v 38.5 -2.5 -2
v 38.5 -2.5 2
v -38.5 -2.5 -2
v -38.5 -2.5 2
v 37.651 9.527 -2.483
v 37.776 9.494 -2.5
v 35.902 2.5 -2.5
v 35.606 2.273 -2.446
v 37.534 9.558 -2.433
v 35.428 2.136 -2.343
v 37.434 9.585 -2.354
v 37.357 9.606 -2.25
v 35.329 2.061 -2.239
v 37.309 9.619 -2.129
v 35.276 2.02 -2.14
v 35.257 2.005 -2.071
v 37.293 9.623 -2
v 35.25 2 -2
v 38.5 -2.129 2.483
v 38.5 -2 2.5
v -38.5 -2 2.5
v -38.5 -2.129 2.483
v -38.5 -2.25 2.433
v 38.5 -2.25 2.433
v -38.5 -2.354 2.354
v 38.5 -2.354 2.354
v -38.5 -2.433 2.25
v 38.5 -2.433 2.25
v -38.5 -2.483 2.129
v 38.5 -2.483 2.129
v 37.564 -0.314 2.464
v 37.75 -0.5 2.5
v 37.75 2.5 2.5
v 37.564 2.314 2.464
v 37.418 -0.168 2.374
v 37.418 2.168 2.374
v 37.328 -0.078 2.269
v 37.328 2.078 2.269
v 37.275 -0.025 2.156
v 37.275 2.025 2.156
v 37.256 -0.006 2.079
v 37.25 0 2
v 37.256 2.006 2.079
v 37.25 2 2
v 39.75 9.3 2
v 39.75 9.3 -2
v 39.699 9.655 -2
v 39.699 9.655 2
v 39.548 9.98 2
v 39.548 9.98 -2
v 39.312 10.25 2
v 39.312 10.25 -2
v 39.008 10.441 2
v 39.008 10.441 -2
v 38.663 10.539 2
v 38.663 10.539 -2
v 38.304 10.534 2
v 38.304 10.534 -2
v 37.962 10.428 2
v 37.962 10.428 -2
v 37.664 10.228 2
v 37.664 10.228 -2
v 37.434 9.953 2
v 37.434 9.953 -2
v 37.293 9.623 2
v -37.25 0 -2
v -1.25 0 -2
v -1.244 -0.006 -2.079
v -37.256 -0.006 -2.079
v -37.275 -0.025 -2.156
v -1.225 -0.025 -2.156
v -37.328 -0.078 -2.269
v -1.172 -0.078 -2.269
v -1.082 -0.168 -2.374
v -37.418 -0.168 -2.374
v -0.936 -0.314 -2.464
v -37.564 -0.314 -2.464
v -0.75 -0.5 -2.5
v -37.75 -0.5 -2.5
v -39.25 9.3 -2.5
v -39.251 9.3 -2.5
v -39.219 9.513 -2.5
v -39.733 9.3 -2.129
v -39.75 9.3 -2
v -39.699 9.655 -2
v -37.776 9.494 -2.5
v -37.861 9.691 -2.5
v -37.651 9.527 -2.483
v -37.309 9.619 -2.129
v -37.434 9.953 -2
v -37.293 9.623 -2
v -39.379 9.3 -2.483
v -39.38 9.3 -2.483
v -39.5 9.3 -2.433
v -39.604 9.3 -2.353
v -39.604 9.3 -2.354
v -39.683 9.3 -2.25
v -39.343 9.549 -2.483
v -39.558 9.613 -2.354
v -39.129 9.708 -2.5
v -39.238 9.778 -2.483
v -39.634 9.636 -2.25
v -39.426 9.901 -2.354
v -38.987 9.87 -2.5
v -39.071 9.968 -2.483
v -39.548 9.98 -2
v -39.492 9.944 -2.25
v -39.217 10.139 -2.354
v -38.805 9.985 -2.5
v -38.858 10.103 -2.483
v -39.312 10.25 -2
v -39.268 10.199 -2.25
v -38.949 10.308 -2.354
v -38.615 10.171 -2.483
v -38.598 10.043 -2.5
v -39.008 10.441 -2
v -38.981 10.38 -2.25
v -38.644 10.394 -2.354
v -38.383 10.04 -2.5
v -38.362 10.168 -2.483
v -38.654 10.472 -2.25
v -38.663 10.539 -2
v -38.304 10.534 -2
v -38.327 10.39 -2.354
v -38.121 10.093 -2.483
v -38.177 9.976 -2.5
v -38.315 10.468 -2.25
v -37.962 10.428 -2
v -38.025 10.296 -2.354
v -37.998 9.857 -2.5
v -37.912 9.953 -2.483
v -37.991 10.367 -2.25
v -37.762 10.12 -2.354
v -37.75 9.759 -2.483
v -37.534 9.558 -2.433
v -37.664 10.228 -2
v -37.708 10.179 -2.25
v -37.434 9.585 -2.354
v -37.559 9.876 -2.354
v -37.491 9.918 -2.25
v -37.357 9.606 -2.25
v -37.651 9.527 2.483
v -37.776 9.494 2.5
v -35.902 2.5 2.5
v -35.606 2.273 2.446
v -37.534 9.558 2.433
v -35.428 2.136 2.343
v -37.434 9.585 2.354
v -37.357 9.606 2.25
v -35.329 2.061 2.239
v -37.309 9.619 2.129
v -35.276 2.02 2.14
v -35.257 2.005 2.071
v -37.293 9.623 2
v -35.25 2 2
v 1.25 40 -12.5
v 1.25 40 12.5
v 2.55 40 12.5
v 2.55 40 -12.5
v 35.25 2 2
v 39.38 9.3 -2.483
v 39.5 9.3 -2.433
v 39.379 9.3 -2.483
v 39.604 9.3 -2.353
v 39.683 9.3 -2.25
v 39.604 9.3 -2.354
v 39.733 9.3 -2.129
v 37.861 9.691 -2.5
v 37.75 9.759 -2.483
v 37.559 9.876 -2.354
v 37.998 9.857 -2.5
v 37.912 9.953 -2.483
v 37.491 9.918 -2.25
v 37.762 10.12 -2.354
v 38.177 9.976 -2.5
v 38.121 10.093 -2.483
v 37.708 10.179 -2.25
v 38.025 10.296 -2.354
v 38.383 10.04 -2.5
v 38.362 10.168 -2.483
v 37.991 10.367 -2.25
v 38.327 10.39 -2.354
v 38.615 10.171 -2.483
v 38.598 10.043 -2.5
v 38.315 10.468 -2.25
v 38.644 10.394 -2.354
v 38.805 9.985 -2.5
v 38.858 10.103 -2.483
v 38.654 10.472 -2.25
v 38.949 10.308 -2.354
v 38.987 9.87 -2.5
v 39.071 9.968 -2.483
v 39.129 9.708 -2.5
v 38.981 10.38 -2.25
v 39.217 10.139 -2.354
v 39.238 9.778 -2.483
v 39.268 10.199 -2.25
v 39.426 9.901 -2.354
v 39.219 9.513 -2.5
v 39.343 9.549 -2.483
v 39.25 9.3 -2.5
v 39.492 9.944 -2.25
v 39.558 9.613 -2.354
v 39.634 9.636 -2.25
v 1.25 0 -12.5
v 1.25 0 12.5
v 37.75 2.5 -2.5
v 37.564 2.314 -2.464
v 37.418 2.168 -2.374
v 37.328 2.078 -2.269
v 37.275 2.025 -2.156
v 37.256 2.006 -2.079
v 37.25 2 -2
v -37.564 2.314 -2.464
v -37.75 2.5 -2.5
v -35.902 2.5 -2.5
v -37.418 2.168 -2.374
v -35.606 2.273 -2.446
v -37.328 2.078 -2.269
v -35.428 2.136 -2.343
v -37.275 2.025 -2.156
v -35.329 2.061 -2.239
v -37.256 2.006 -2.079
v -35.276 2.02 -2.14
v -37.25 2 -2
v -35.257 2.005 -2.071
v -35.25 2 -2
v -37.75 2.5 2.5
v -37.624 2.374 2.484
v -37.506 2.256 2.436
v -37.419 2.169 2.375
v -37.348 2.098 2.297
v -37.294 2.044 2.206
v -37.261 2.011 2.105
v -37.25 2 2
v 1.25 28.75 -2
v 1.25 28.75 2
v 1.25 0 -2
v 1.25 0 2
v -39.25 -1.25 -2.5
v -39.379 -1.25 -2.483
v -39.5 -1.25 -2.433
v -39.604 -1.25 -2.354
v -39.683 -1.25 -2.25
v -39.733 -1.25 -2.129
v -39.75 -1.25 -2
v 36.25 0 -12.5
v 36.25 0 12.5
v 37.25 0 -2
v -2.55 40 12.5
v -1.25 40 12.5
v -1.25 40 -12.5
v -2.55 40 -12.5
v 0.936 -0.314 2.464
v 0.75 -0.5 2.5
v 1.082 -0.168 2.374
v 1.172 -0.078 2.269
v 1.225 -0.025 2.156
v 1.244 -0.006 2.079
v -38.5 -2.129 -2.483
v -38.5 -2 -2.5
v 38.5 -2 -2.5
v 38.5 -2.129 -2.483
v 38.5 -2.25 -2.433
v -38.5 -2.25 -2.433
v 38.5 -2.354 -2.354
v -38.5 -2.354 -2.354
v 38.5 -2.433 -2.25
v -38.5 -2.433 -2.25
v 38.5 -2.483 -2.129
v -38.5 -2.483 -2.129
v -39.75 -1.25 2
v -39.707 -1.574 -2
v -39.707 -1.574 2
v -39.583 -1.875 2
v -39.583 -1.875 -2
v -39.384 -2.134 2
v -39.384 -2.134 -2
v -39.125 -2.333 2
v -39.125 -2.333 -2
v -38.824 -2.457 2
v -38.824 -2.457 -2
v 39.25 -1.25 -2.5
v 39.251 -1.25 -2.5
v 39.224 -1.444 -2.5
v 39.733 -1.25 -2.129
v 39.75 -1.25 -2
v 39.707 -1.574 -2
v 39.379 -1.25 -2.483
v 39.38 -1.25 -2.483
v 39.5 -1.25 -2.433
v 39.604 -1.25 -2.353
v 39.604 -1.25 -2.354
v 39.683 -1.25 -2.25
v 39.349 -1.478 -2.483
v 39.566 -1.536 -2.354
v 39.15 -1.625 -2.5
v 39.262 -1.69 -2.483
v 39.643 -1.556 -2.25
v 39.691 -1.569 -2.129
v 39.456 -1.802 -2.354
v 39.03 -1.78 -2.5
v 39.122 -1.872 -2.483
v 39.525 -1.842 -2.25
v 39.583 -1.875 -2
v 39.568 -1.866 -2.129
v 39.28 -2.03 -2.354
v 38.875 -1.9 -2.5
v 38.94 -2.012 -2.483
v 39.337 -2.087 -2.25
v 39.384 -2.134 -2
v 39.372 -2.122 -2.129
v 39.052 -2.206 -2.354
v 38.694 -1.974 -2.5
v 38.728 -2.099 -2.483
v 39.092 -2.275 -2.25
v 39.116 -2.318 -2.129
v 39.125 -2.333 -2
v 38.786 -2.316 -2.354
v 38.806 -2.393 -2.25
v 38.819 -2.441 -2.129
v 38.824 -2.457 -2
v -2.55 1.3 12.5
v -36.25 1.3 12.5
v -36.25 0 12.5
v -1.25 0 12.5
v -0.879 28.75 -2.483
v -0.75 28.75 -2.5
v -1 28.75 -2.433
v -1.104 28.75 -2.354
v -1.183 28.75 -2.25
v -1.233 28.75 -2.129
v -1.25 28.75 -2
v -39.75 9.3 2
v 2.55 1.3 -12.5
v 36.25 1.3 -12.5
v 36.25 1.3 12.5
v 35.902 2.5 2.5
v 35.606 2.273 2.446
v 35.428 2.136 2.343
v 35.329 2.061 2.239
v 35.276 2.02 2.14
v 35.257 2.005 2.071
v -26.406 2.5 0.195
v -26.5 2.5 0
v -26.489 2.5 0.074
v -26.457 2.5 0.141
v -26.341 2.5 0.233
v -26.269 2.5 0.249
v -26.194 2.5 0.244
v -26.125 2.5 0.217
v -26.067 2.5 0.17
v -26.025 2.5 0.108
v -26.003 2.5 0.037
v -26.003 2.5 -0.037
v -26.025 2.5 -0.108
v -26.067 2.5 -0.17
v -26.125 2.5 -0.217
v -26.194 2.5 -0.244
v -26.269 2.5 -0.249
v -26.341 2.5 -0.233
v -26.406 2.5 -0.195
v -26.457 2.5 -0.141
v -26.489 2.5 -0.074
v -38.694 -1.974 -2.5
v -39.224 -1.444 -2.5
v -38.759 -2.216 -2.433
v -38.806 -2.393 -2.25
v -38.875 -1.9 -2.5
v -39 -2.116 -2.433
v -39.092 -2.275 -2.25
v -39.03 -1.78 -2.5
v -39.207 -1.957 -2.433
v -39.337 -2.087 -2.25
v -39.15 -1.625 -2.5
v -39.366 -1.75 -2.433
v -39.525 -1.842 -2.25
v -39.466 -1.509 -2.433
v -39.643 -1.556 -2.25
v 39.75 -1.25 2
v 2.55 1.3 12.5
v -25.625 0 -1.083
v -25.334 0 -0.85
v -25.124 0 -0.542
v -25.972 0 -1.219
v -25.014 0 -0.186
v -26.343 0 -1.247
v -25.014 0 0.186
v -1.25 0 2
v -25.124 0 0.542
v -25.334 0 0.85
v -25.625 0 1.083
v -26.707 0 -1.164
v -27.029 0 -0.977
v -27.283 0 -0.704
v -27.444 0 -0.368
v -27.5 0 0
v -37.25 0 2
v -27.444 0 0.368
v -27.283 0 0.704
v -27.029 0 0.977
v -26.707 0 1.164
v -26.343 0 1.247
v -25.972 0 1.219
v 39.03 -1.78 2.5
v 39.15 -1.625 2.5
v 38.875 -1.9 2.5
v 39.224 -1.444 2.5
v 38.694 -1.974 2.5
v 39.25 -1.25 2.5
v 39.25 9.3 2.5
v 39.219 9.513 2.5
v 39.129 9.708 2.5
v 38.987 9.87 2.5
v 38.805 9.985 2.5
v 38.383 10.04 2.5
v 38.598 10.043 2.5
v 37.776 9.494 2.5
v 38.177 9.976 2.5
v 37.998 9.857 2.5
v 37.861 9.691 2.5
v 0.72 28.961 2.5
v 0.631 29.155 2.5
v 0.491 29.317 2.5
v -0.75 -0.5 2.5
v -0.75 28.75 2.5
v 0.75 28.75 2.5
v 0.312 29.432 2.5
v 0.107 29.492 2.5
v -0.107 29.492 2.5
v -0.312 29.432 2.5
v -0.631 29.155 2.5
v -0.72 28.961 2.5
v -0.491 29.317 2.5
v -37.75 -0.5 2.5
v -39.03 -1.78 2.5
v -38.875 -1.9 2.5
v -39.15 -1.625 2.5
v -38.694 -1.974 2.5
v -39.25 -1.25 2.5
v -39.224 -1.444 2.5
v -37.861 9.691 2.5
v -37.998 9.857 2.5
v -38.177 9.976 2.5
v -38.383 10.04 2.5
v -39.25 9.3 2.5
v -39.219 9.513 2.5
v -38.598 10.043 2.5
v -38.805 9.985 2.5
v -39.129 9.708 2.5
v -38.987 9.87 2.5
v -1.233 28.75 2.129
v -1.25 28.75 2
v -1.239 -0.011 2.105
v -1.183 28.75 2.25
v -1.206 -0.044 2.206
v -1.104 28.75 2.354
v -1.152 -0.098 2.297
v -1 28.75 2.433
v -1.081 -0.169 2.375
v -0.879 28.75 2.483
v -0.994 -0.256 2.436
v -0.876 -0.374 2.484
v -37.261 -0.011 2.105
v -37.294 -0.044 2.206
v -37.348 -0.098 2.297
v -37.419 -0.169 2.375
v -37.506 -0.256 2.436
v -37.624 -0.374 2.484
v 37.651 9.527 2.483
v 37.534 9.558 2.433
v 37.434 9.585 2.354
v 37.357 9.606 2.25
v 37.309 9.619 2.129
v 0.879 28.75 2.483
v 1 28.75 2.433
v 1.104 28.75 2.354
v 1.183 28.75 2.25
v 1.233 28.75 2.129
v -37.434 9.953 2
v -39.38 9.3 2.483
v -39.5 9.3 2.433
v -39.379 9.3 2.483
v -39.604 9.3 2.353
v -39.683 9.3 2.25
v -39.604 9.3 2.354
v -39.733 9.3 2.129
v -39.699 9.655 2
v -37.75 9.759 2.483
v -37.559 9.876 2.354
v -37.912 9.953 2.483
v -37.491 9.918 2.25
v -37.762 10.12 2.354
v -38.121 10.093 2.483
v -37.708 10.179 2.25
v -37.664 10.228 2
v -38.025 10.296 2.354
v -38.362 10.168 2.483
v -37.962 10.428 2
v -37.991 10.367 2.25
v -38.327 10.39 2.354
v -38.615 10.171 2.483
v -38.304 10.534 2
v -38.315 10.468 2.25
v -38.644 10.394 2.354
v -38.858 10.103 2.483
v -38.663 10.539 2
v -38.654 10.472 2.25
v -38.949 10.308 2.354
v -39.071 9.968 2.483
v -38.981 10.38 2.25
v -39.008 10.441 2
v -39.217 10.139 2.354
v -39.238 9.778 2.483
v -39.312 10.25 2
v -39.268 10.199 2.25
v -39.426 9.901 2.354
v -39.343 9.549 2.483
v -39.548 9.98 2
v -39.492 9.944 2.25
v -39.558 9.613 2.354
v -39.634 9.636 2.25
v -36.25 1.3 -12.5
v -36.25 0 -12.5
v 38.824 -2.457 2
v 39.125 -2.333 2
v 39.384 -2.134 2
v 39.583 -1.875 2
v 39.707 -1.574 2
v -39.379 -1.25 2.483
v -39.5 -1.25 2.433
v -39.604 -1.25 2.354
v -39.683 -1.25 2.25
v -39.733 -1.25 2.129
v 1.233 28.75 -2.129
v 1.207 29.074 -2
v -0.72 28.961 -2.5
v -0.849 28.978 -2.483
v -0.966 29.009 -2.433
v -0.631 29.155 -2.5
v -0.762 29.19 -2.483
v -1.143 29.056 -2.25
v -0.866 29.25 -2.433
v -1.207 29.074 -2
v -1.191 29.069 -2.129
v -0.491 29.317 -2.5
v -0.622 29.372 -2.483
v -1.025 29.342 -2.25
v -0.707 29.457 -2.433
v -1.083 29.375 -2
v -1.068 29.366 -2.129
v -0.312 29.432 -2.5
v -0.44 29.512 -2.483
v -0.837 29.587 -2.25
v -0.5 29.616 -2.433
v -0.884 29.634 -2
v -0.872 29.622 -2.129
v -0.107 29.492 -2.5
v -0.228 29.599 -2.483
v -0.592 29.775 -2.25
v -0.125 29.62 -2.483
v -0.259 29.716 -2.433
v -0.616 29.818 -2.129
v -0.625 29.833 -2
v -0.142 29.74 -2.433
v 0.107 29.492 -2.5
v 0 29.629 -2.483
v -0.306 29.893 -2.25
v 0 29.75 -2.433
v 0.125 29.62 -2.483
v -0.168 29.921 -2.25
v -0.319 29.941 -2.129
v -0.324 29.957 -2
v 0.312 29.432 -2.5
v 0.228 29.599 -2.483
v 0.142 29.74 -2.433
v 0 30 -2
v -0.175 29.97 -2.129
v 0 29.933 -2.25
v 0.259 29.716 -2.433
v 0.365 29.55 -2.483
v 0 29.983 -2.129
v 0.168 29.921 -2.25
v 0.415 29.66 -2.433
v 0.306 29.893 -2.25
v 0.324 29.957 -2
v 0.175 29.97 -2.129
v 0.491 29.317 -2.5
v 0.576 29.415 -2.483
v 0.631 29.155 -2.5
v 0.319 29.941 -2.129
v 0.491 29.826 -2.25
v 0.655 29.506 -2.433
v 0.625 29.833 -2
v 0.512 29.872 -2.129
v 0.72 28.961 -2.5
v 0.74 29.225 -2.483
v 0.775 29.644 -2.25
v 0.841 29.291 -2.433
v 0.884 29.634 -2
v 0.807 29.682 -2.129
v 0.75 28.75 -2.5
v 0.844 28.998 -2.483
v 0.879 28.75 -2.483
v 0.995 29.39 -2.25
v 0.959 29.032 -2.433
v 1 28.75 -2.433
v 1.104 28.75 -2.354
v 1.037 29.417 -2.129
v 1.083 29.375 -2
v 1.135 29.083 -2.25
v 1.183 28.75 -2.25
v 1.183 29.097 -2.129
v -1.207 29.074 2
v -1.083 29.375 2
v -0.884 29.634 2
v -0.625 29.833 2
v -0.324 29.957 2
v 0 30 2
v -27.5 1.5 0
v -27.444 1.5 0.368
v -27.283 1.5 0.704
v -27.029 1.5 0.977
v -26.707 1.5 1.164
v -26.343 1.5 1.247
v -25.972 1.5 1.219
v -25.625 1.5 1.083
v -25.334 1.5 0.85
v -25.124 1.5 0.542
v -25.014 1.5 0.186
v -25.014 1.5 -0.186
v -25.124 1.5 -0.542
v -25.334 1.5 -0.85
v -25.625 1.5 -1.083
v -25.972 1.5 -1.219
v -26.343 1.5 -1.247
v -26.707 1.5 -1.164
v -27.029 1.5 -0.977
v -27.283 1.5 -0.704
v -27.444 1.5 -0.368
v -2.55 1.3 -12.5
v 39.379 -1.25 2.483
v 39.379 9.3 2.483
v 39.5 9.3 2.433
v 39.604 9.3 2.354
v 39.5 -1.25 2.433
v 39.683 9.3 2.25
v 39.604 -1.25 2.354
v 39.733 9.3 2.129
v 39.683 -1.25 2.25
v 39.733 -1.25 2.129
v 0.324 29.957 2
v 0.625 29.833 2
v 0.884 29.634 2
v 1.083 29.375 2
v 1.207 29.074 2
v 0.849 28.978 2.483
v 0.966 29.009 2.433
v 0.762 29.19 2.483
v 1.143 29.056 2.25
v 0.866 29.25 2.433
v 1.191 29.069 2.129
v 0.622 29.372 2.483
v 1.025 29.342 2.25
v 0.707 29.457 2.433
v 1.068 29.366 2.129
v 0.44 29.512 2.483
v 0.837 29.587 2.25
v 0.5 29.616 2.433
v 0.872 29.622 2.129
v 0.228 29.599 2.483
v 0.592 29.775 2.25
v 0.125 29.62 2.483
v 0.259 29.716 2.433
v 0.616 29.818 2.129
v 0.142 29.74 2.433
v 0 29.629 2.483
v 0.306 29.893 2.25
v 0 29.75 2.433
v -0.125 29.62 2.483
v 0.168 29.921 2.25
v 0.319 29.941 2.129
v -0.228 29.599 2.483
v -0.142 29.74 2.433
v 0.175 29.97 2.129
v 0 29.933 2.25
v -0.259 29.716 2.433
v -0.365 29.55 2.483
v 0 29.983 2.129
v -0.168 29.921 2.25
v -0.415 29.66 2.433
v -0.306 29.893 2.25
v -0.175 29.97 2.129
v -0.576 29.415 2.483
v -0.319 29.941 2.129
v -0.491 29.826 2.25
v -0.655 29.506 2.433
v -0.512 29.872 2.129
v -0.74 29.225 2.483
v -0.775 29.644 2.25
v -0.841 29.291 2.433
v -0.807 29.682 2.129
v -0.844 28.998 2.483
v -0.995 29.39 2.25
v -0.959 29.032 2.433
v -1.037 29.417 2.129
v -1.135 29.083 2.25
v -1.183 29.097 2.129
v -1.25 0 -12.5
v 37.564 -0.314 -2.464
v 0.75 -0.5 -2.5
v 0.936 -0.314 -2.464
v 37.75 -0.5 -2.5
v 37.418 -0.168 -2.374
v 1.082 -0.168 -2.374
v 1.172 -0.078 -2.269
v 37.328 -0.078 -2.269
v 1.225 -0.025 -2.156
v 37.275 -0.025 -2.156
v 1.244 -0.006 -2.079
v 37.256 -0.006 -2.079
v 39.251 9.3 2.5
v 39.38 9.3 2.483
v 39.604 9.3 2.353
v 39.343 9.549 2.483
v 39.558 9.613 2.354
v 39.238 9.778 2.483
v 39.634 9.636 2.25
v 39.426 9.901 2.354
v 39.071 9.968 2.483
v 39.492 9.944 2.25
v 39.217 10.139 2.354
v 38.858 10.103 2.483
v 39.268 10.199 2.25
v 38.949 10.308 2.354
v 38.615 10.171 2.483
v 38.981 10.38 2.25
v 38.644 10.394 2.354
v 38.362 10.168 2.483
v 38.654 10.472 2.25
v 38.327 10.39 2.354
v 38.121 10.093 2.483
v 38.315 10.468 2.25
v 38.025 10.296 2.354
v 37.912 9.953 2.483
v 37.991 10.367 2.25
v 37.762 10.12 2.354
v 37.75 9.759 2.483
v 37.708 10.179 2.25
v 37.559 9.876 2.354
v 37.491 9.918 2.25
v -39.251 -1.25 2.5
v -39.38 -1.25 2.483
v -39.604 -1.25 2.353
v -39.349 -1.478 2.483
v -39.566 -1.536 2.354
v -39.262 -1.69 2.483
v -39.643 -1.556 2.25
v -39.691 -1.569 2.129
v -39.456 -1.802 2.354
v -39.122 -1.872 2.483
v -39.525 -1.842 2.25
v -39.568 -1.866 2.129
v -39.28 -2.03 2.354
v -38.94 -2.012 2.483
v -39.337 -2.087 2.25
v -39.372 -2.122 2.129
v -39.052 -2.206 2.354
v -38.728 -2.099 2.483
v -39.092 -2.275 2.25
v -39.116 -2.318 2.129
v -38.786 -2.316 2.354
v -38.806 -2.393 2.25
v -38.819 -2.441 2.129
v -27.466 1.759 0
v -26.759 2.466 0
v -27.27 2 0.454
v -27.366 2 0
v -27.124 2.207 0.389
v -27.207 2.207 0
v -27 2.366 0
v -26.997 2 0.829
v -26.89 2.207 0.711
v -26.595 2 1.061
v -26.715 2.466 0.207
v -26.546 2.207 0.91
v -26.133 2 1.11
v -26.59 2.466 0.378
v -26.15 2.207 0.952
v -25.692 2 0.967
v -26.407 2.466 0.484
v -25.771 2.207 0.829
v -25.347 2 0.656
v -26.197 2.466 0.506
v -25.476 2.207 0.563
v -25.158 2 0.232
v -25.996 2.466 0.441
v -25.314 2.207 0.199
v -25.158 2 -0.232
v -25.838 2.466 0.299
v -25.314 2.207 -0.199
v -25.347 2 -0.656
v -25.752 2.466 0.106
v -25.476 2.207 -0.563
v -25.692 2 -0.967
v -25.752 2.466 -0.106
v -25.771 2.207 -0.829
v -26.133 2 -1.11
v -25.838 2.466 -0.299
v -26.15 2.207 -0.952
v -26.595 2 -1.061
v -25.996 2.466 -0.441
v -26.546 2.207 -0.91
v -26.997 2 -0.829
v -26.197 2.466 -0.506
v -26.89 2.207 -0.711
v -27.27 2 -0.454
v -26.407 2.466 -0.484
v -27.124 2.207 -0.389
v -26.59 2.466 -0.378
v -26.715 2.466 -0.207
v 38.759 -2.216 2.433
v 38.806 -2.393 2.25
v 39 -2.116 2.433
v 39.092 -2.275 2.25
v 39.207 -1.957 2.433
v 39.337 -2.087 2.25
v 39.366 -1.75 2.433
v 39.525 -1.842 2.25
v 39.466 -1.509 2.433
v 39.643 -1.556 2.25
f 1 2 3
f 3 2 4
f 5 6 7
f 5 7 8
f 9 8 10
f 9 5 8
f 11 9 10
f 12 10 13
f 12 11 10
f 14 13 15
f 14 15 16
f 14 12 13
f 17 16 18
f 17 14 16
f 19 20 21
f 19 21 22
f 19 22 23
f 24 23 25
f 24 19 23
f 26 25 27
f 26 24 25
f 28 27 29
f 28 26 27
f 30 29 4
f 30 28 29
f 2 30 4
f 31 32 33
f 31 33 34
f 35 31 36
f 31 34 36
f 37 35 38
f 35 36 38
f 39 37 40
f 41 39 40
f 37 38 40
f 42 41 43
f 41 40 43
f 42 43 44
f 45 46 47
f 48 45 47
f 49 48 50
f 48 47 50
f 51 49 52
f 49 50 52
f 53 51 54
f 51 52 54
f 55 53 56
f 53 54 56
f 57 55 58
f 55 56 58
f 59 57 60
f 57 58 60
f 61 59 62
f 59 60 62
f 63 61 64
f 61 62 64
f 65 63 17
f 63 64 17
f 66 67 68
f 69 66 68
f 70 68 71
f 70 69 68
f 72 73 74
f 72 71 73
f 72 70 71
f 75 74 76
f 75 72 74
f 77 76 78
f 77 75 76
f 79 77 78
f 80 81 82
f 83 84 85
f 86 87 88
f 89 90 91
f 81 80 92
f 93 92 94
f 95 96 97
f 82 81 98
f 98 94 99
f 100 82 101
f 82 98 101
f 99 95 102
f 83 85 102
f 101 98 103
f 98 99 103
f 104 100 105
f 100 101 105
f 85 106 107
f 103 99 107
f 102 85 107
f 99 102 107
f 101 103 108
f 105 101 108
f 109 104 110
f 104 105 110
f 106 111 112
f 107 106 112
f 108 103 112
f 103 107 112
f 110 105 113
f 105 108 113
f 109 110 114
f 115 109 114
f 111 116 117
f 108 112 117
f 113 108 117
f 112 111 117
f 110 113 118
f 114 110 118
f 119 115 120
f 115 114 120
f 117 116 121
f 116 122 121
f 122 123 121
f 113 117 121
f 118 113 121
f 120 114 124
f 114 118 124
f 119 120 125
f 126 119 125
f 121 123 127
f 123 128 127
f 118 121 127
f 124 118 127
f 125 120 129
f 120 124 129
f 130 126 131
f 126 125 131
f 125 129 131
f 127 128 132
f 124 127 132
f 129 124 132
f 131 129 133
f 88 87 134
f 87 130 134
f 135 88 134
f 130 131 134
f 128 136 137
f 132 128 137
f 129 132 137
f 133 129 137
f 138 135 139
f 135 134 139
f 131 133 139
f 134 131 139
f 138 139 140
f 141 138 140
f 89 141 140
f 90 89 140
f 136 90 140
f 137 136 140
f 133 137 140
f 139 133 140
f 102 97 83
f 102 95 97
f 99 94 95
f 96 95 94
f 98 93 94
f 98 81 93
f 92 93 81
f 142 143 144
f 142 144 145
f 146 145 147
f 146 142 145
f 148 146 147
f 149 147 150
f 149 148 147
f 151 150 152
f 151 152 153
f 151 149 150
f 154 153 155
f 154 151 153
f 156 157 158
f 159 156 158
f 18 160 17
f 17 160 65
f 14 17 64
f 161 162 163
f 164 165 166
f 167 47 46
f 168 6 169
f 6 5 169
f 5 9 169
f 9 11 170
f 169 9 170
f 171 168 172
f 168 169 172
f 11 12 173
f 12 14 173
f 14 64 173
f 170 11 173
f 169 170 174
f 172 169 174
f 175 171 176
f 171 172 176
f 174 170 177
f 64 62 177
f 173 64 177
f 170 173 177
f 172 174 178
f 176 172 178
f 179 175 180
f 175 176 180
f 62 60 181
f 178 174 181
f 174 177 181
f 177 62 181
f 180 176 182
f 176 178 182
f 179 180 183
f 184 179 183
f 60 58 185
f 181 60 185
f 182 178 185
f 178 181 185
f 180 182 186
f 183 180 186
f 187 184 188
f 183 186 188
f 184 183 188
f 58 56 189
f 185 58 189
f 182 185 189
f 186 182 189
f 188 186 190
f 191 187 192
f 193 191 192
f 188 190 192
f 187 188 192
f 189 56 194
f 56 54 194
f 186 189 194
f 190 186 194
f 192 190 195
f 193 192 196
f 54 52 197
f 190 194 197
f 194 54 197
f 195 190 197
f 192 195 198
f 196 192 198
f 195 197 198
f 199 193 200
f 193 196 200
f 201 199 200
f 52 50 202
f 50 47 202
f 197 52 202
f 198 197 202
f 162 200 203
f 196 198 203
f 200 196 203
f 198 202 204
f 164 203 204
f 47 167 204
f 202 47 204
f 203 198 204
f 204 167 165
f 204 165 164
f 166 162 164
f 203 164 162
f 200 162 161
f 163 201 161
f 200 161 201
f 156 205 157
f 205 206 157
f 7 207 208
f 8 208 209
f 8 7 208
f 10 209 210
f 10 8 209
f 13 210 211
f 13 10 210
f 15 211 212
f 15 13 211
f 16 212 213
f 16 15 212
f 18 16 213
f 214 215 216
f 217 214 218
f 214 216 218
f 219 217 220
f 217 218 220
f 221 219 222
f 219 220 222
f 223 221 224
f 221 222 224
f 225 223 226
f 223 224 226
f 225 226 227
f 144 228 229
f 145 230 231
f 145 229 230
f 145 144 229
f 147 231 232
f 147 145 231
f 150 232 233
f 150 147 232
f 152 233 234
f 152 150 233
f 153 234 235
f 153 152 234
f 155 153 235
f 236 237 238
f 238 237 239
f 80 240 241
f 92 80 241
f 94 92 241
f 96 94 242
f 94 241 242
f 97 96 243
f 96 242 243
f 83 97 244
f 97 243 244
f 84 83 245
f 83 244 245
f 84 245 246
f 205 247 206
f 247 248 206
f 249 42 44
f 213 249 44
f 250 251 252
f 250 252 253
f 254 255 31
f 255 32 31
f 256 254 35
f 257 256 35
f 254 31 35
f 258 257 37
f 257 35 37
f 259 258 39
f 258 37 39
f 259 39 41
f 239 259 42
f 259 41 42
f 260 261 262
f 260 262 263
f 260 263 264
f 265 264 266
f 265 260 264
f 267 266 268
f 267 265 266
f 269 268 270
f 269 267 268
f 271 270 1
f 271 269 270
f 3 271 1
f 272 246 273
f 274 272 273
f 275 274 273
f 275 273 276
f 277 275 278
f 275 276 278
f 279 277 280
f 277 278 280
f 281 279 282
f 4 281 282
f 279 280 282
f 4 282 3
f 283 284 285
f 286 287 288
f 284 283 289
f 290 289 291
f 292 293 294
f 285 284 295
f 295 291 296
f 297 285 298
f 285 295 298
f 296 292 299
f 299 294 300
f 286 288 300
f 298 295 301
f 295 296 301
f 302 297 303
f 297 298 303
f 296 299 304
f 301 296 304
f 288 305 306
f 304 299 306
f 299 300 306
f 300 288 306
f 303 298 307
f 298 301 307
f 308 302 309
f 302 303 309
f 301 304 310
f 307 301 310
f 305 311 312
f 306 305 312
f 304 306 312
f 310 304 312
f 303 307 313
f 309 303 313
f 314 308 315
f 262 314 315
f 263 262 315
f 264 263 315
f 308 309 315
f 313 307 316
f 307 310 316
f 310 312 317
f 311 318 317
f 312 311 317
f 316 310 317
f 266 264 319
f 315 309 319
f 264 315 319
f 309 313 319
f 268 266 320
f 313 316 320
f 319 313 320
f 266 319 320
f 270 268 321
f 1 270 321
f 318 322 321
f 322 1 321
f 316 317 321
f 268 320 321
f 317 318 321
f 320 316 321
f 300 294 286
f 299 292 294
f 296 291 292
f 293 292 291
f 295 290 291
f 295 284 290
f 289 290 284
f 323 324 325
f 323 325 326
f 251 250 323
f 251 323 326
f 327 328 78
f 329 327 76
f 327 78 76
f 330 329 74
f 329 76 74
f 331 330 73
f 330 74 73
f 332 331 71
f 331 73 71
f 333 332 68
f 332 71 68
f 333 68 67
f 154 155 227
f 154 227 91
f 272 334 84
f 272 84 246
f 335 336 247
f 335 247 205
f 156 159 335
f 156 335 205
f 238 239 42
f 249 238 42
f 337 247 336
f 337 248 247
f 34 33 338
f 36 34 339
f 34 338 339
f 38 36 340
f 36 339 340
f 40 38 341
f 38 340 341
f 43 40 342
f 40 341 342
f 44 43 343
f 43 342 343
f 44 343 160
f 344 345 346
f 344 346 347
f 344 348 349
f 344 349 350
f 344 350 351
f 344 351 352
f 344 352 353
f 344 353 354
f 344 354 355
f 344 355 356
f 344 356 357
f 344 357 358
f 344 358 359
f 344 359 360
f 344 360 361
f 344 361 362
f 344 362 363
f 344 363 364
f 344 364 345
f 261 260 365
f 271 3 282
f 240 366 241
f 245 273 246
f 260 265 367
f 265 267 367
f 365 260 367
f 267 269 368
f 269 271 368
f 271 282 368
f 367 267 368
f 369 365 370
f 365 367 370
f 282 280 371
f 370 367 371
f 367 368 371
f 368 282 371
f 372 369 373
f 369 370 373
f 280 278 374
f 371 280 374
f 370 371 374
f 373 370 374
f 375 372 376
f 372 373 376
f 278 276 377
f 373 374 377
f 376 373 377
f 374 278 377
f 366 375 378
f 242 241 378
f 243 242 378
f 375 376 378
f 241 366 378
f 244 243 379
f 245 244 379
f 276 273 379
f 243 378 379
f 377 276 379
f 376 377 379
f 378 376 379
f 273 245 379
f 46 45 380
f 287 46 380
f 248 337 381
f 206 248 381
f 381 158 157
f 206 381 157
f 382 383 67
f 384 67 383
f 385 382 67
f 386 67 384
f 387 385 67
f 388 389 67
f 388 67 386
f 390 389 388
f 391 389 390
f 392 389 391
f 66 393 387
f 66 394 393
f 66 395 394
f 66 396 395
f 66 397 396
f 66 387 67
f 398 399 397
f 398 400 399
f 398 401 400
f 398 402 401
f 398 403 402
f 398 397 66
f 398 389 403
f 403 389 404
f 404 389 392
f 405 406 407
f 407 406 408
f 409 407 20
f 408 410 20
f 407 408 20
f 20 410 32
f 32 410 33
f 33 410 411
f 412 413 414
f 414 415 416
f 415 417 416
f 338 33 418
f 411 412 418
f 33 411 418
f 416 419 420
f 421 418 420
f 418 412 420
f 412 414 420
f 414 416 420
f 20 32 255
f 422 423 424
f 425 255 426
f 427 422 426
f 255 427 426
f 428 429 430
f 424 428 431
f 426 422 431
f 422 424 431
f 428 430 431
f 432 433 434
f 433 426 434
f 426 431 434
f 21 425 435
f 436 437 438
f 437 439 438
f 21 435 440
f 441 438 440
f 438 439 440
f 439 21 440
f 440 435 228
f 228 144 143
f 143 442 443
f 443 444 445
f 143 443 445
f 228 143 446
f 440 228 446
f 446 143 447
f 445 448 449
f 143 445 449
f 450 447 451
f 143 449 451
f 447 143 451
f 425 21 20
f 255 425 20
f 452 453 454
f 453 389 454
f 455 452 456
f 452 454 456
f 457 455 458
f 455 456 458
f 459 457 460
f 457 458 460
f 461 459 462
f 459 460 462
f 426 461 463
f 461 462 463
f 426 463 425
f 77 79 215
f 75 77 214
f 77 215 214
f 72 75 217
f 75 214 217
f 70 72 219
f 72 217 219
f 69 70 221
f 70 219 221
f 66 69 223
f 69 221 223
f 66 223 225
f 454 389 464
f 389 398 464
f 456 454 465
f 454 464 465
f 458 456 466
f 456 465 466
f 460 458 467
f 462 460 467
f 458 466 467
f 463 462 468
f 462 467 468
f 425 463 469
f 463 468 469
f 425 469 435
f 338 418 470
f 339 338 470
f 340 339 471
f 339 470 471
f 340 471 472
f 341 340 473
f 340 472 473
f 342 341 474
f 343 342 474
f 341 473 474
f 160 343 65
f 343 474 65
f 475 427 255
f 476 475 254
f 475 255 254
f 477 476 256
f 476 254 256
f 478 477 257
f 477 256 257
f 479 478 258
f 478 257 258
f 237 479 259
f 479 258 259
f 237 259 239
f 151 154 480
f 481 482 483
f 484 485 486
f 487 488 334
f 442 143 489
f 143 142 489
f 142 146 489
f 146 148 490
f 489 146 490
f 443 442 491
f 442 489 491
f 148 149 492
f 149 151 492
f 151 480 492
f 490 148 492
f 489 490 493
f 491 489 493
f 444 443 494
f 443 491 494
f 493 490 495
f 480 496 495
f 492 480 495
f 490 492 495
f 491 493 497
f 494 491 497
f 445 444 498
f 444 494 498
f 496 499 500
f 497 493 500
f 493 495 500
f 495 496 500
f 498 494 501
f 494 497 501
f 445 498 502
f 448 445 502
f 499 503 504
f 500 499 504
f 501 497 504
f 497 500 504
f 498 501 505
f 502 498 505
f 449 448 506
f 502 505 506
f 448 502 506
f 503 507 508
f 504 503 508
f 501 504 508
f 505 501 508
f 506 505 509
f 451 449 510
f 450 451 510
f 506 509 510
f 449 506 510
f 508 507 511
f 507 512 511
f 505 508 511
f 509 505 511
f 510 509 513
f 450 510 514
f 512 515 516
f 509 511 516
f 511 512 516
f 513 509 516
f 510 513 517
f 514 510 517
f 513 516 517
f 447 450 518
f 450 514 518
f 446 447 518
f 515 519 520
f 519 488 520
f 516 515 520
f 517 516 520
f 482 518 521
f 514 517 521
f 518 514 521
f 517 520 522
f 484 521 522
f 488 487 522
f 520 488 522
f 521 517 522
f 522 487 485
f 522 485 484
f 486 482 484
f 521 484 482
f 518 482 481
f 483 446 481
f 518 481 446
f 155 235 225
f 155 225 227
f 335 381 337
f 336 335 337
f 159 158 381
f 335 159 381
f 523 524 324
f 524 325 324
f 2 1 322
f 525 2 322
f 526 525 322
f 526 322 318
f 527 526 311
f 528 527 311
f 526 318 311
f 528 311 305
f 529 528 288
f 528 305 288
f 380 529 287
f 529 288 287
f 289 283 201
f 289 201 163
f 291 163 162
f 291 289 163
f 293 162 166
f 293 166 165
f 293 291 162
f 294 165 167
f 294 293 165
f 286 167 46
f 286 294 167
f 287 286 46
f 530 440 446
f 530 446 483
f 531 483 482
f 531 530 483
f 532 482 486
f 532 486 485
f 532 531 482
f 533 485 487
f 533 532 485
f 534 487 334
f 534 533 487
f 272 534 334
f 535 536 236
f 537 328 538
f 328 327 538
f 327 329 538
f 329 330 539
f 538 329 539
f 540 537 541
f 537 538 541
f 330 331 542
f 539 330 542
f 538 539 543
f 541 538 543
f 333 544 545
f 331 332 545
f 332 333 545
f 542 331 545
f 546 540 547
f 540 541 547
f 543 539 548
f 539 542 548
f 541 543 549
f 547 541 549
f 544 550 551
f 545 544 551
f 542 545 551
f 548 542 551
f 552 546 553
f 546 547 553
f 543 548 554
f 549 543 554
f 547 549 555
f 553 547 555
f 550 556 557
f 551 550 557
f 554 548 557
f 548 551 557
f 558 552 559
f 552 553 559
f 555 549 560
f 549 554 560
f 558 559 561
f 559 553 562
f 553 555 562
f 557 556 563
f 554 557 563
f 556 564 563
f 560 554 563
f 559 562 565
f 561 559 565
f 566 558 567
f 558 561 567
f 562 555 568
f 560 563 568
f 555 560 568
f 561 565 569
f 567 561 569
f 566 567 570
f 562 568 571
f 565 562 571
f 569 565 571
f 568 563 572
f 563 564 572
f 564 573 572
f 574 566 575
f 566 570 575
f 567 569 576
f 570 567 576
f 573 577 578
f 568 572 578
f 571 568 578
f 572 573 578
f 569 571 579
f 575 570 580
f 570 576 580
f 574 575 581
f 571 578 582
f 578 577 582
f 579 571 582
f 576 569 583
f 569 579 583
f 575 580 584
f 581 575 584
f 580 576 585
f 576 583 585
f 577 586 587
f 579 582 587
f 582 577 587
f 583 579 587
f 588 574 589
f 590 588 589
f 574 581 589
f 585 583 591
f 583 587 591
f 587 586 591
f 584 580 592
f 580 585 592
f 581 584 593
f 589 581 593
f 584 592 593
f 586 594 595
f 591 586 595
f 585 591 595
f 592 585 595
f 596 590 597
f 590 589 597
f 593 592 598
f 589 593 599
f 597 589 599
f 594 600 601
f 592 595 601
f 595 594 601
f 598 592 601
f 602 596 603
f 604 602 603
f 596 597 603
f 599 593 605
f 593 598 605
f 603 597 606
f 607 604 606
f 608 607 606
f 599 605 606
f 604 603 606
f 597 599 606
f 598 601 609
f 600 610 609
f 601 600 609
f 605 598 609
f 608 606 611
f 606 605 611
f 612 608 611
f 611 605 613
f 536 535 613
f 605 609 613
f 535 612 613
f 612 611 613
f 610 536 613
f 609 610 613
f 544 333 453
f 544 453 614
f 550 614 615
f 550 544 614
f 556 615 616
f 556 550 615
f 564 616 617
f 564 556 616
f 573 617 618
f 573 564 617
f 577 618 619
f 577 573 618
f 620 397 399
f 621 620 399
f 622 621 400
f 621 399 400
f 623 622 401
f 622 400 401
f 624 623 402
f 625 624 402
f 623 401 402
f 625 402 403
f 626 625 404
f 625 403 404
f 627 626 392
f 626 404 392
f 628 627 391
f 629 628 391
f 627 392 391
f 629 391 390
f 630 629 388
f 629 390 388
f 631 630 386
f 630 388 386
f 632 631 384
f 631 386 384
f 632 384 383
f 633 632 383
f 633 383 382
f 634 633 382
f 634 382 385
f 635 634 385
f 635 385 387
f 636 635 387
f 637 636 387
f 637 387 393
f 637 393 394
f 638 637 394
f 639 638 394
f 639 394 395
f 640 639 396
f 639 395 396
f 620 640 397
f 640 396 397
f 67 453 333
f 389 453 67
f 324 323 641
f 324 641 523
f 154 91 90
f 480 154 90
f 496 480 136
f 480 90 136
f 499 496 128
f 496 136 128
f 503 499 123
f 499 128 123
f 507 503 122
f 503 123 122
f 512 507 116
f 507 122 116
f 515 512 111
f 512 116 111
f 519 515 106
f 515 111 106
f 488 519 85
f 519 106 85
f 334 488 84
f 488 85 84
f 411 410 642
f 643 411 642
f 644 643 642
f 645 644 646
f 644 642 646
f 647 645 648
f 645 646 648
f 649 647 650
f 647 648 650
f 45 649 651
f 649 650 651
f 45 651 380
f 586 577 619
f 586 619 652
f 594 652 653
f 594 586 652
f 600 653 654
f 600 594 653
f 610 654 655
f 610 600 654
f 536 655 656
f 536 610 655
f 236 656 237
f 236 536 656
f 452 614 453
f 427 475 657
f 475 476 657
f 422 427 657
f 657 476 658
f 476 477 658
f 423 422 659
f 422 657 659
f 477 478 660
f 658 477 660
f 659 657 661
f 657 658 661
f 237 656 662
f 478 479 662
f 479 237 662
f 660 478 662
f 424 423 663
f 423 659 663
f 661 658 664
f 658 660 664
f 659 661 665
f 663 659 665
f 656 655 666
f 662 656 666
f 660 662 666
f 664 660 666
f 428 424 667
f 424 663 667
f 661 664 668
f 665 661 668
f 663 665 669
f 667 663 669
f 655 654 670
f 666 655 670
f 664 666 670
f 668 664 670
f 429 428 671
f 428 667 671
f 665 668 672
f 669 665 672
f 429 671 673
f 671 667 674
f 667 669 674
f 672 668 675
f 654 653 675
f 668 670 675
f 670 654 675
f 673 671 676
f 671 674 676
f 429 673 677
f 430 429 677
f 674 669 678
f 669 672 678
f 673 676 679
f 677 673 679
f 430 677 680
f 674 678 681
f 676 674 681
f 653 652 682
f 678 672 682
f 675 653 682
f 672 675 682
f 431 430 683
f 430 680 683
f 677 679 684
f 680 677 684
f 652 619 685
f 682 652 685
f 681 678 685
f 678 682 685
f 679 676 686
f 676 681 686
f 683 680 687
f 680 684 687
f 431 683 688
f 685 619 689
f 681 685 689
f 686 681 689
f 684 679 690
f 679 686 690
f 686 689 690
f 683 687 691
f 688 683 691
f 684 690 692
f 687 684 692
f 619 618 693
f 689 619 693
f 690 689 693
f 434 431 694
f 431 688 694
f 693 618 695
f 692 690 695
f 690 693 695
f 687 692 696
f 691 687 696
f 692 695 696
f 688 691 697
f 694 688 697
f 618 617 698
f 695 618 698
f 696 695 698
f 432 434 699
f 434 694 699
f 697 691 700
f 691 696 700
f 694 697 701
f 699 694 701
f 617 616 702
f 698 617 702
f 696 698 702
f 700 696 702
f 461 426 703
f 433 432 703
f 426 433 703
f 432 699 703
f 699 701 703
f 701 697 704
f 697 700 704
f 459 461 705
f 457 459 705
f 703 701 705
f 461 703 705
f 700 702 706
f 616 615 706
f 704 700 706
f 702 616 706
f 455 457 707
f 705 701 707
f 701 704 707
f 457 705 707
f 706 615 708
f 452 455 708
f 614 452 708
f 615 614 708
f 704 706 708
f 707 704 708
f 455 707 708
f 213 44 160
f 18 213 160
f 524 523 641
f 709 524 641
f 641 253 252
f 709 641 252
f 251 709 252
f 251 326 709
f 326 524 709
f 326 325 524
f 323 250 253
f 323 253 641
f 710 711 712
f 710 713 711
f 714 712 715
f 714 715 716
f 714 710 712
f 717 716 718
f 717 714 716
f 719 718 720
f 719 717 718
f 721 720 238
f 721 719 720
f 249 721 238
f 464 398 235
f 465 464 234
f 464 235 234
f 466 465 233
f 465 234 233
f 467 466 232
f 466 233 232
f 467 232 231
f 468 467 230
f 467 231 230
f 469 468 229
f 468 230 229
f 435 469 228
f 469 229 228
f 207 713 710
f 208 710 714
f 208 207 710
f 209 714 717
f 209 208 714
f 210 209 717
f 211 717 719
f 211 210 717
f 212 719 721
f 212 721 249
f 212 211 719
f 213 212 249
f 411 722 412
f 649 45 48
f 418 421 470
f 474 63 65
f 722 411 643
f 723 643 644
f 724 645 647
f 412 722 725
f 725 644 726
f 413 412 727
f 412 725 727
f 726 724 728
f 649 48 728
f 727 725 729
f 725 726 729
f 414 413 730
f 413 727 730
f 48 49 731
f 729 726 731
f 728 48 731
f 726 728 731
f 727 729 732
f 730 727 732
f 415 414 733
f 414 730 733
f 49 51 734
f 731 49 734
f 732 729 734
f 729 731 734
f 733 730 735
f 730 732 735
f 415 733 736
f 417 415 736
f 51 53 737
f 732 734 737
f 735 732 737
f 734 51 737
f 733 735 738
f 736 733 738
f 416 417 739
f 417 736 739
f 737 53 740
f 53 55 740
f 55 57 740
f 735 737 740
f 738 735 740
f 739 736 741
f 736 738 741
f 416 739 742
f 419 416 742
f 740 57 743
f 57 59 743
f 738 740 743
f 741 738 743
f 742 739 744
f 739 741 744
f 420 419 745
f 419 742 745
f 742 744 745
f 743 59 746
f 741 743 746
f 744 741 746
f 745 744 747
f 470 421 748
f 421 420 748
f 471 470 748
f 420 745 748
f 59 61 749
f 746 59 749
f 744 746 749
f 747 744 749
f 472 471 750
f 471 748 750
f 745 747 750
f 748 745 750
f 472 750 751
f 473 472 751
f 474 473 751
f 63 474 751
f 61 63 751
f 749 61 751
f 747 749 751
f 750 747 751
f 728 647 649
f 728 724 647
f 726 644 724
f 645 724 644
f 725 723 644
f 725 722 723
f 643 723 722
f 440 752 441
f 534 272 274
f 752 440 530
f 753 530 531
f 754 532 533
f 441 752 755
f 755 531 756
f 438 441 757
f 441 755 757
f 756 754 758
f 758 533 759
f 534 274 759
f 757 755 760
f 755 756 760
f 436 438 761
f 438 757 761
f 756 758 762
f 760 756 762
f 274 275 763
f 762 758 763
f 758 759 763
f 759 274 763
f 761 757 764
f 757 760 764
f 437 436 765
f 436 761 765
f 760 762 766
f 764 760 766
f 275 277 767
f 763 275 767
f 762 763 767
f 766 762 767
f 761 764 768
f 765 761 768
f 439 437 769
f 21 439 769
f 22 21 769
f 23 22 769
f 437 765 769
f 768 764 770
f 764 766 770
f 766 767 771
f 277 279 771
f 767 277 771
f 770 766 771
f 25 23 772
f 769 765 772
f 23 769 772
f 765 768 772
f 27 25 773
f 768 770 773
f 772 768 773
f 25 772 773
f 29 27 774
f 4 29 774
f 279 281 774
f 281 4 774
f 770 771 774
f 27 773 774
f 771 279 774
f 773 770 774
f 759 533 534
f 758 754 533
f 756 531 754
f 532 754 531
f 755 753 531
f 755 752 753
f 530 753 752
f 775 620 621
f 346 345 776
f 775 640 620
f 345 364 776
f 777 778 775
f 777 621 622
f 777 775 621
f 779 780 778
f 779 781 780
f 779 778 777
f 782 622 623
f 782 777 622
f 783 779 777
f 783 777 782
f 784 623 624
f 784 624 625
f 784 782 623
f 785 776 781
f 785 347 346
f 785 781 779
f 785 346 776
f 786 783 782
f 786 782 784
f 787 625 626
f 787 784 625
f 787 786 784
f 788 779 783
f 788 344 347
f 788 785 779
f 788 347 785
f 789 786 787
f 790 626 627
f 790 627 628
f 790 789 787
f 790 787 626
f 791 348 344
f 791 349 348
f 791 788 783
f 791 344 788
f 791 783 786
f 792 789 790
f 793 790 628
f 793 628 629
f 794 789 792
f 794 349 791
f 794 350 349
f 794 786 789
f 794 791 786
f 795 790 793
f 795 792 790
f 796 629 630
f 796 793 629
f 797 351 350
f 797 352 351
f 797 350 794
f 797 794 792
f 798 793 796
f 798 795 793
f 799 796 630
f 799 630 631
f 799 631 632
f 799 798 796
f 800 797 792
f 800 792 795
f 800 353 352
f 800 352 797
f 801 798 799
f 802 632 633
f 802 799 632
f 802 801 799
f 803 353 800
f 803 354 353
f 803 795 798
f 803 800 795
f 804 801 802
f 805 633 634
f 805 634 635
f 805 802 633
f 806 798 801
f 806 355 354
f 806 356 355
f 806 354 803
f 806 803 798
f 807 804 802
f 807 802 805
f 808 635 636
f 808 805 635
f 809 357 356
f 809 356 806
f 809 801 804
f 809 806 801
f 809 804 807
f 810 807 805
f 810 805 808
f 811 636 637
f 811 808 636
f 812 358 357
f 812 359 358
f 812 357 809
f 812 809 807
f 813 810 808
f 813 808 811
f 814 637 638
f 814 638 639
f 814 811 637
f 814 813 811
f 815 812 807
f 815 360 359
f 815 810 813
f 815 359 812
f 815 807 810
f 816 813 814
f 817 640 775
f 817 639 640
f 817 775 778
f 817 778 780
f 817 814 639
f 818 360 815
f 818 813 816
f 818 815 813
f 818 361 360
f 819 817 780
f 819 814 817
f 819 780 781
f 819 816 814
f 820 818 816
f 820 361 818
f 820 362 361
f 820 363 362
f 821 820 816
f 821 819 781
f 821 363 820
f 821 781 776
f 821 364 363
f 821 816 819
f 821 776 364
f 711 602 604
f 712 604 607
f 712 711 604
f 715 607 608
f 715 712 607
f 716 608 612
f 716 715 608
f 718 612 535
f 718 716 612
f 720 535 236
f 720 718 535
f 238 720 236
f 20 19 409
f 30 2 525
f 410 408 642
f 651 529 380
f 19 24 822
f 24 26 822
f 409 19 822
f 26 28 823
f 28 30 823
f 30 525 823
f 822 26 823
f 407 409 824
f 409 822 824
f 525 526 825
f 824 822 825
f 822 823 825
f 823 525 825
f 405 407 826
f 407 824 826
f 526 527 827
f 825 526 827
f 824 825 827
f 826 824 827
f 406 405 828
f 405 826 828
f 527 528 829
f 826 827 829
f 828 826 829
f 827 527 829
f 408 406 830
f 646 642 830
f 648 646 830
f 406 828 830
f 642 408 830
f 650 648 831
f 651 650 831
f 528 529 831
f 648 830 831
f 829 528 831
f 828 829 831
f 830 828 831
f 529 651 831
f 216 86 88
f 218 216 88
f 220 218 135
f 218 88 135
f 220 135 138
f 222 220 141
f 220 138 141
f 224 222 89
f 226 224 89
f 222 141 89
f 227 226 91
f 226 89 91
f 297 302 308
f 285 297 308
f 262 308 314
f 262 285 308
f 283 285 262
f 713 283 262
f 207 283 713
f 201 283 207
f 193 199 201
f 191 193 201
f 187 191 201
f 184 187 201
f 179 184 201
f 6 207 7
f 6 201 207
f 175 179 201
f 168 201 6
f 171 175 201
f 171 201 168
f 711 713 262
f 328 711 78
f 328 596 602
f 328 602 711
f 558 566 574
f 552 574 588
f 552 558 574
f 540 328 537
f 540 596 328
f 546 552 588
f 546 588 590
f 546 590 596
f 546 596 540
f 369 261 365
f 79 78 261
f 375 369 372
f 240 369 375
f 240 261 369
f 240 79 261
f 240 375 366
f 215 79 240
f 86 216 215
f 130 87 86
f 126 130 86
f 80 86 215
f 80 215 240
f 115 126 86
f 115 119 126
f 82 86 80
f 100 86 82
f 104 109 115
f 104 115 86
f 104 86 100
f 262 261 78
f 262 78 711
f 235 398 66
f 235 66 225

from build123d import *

# Parameters (mm, degrees)
F2_DEPTH     = 2.5
F4_R         = 1.25
F5_DEPTH     = 2.5
F6_R         = 1
F7_R         = 0.5
F8_T1_DEPTH  = 5
F8_T4_ANGLE  = 90
F8_T6_ANGLE  = 90
F8_T8_ANGLE  = 90
F8_T10_ANGLE = 90
F8_T12_ANGLE = 165
F8_T14_ANGLE = 165
F8_T16_ANGLE = 165
F8_T18_ANGLE = 165
F8_T20_ANGLE = 90
F8_T22_ANGLE = 90
F8_T24_ANGLE = 90
F8_T26_ANGLE = 90
F0_W         = 8
F0_H         = 1.3
F0_W_2       = 4
F9_DEPTH     = 12.5


# Not quite as in the source:
# - a fillet or chamfer that OpenCascade refuses, or shapes differently, is made with other operations: its cross-section is extruded or revolved along the edge and cut away or added


with BuildPart() as f2:
    # F1 (on Top) → F2 (new body, symmetric)
    with BuildSketch(Plane.XY):
        Polygon((-37.25, 0), (-37.25, 2), (-35.25, 2), (-39.75, 18.7942286341), (-39.75, -2.5), (0, -2.5), (0, 30), (-1.25, 30), (-1.25, 0), align=None)
    extrude(amount=F2_DEPTH, both=True)

    # F3: F2 across plane


with BuildPart() as f2_1:
    add(f2.part)
    add(f2.part.mirror(Plane.YZ))

    # F4 (on face) → F5 (join)
    with BuildSketch(Plane(origin=(0, 0, 0), x_dir=(-1, 0, 0), z_dir=(0, 1, 0))):
        with Locations((26.25, 0)):
            Circle(F4_R)
    extrude(amount=F5_DEPTH)

    # F6
    f6_edges = [f2_1.edges().sort_by_distance(p)[0] for p in [
        (-25, 2.5, 0),
    ]]
    fillet(f6_edges, radius=F6_R)

    # F7
    f7_edges = [f2_1.edges().sort_by_distance(p)[0] for p in [
        (-37.25, 1, -2.5),
        (-36.25, 2, -2.5),
        (-37.5, 10.397114, -2.5),
        (-39.75, 8.147114, -2.5),
        (0, -2.5, -2.5),
        (39.75, 8.147114, -2.5),
        (37.5, 10.397114, -2.5),
        (36.25, 2, -2.5),
        (37.25, 1, -2.5),
        (19.25, 0, -2.5),
        (1.25, 15, -2.5),
        (0, 30, -2.5),
        (-1.25, 15, -2.5),
        (-19.25, 0, -2.5),
        (-37.25, 1, 2.5),
        (-36.25, 2, 2.5),
        (-37.5, 10.397114, 2.5),
        (-39.75, 8.147114, 2.5),
        (0, -2.5, 2.5),
        (39.75, 8.147114, 2.5),
        (37.5, 10.397114, 2.5),
        (36.25, 2, 2.5),
        (37.25, 1, 2.5),
        (19.25, 0, 2.5),
        (1.25, 15, 2.5),
        (0, 30, 2.5),
        (-1.25, 15, 2.5),
        (-19.25, 0, 2.5),
    ]]
    fillet(f7_edges, radius=F7_R)

    # F8: fillet of radius 1.25 on 6 edges, made by hand

    # F8_s2 → F8_t1 (cut)
    with BuildSketch(Plane.XY.offset(-2.5)):
        with BuildLine():
            ThreePointArc((0, 30), (0.8838834765, 29.6338834765), (1.25, 28.75))
            Line((1.25, 28.75), (1.25, 30))
            Line((1.25, 30), (0, 30))
        make_face()
        with BuildLine():
            ThreePointArc((-1.25, 28.75), (-0.8838834765, 29.6338834765), (0, 30))
            Line((0, 30), (-1.25, 30))
            Line((-1.25, 30), (-1.25, 28.75))
        make_face()
        with BuildLine():
            ThreePointArc((-37.2925927171, 9.6230597995), (-38.6631577403, 10.5388420699), (-39.75, 9.2995359932))
            Line((-39.75, 9.2995359932), (-39.75, 18.7942286341))
            Line((-39.75, 18.7942286341), (-37.2925927171, 9.6230597995))
        make_face()
        with BuildLine():
            ThreePointArc((39.75, 9.2995359932), (38.6631577403, 10.5388420699), (37.2925927171, 9.6230597995))
            Line((37.2925927171, 9.6230597995), (39.75, 18.7942286341))
            Line((39.75, 18.7942286341), (39.75, 9.2995359932))
        make_face()
        with BuildLine():
            ThreePointArc((38.5, -2.5), (39.3838834765, -2.1338834765), (39.75, -1.25))
            Line((39.75, -1.25), (39.75, -2.5))
            Line((39.75, -2.5), (38.5, -2.5))
        make_face()
        with BuildLine():
            ThreePointArc((-39.75, -1.25), (-39.3838834765, -2.1338834765), (-38.5, -2.5))
            Line((-38.5, -2.5), (-39.75, -2.5))
            Line((-39.75, -2.5), (-39.75, -1.25))
        make_face()
    extrude(amount=F8_T1_DEPTH, mode=Mode.SUBTRACT)

    # F8_s3 → F8_t4 (revolve, cut)
    with BuildSketch(Plane.YZ.offset(-38.5)):
        with BuildLine():
            ThreePointArc((-2, -2.5), (-2.3535533906, -2.3535533906), (-2.5, -2))
            Line((-2.5, -2), (-2.5, -2.5))
            Line((-2.5, -2.5), (-2, -2.5))
        make_face()
    revolve(axis=Axis((-38.5, -1.25, -2.5), (0, 0, -1)), revolution_arc=F8_T4_ANGLE, mode=Mode.SUBTRACT)

    # F8_s5 → F8_t6 (revolve, cut)
    with BuildSketch(Plane.XZ.offset(1.25)):
        with BuildLine():
            ThreePointArc((-39.25, 2.5), (-39.6035533906, 2.3535533906), (-39.75, 2))
            Line((-39.75, 2), (-39.75, 2.5))
            Line((-39.75, 2.5), (-39.25, 2.5))
        make_face()
    revolve(axis=Axis((-38.5, -1.25, 2.5), (0, 0, 1)), revolution_arc=F8_T6_ANGLE, mode=Mode.SUBTRACT)

    # F8_s7 → F8_t8 (revolve, cut)
    with BuildSketch(Plane.XZ.offset(1.25)):
        with BuildLine():
            ThreePointArc((39.25, -2.5), (39.6035533906, -2.3535533906), (39.75, -2))
            Line((39.75, -2), (39.75, -2.5))
            Line((39.75, -2.5), (39.25, -2.5))
        make_face()
    revolve(axis=Axis((38.5, -1.25, -2.5), (0, 0, -1)), revolution_arc=F8_T8_ANGLE, mode=Mode.SUBTRACT)

    # F8_s9 → F8_t10 (revolve, cut)
    with BuildSketch(Plane.YZ.offset(38.5)):
        with BuildLine():
            ThreePointArc((-2, 2.5), (-2.3535533906, 2.3535533906), (-2.5, 2))
            Line((-2.5, 2), (-2.5, 2.5))
            Line((-2.5, 2.5), (-2, 2.5))
        make_face()
    revolve(axis=Axis((38.5, -1.25, 2.5), (0, 0, 1)), revolution_arc=F8_T10_ANGLE, mode=Mode.SUBTRACT)

    # F8_s11 → F8_t12 (revolve, cut)
    with BuildSketch(Plane(origin=(4.9038949754, 18.3015852033, 0), x_dir=(0, 0, 1), z_dir=(-0.2588190451, -0.9659258263, 0))):
        with BuildLine():
            ThreePointArc((-2.5, -34.0312472865), (-2.3535533906, -33.6776938959), (-2, -33.5312472865))
            Line((-2, -33.5312472865), (-2.5, -33.5312472865))
            Line((-2.5, -33.5312472865), (-2.5, -34.0312472865))
        make_face()
    revolve(axis=Axis((38.5, 9.2995359932, -2.5), (0, 0, -1)), revolution_arc=F8_T12_ANGLE, mode=Mode.SUBTRACT)

    # F8_s13 → F8_t14 (revolve, cut)
    with BuildSketch(Plane.XZ.offset(-9.2995359932)):
        with BuildLine():
            ThreePointArc((39.25, 2.5), (39.6035533906, 2.3535533906), (39.75, 2))
            Line((39.75, 2), (39.75, 2.5))
            Line((39.75, 2.5), (39.25, 2.5))
        make_face()
    revolve(axis=Axis((38.5, 9.2995359932, 2.5), (0, 0, 1)), revolution_arc=F8_T14_ANGLE, mode=Mode.SUBTRACT)

    # F8_s15 → F8_t16 (revolve, cut)
    with BuildSketch(Plane.XZ.offset(-9.2995359932)):
        with BuildLine():
            ThreePointArc((-39.25, -2.5), (-39.6035533906, -2.3535533906), (-39.75, -2))
            Line((-39.75, -2), (-39.75, -2.5))
            Line((-39.75, -2.5), (-39.25, -2.5))
        make_face()
    revolve(axis=Axis((-38.5, 9.2995359932, -2.5), (0, 0, -1)), revolution_arc=F8_T16_ANGLE, mode=Mode.SUBTRACT)

    # F8_s17 → F8_t18 (revolve, cut)
    with BuildSketch(Plane(origin=(-4.9038949754, 18.3015852033, 0), x_dir=(0, 0, 1), z_dir=(0.2588190451, -0.9659258263, 0))):
        with BuildLine():
            ThreePointArc((2.5, 34.0312472865), (2.3535533906, 33.6776938959), (2, 33.5312472865))
            Line((2, 33.5312472865), (2.5, 33.5312472865))
            Line((2.5, 33.5312472865), (2.5, 34.0312472865))
        make_face()
    revolve(axis=Axis((-38.5, 9.2995359932, 2.5), (0, 0, 1)), revolution_arc=F8_T18_ANGLE, mode=Mode.SUBTRACT)

    # F8_s19 → F8_t20 (revolve, cut)
    with BuildSketch(Plane.YZ):
        with BuildLine():
            ThreePointArc((29.5, 2.5), (29.8535533906, 2.3535533906), (30, 2))
            Line((30, 2), (30, 2.5))
            Line((30, 2.5), (29.5, 2.5))
        make_face()
    revolve(axis=Axis((0, 28.75, 2.5), (0, 0, 1)), revolution_arc=F8_T20_ANGLE, mode=Mode.SUBTRACT)

    # F8_s21 → F8_t22 (revolve, cut)
    with BuildSketch(Plane.XZ.offset(-28.75)):
        with BuildLine():
            ThreePointArc((-0.75, -2.5), (-1.1035533906, -2.3535533906), (-1.25, -2))
            Line((-1.25, -2), (-1.25, -2.5))
            Line((-1.25, -2.5), (-0.75, -2.5))
        make_face()
    revolve(axis=Axis((0, 28.75, -2.5), (0, 0, -1)), revolution_arc=F8_T22_ANGLE, mode=Mode.SUBTRACT)

    # F8_s23 → F8_t24 (revolve, cut)
    with BuildSketch(Plane.XZ.offset(-28.75)):
        with BuildLine():
            ThreePointArc((0.75, 2.5), (1.1035533906, 2.3535533906), (1.25, 2))
            Line((1.25, 2), (1.25, 2.5))
            Line((1.25, 2.5), (0.75, 2.5))
        make_face()
    revolve(axis=Axis((0, 28.75, 2.5), (0, 0, 1)), revolution_arc=F8_T24_ANGLE, mode=Mode.SUBTRACT)

    # F8_s25 → F8_t26 (revolve, cut)
    with BuildSketch(Plane.YZ):
        with BuildLine():
            ThreePointArc((29.5, -2.5), (29.8535533906, -2.3535533906), (30, -2))
            Line((30, -2), (30, -2.5))
            Line((30, -2.5), (29.5, -2.5))
        make_face()
    revolve(axis=Axis((0, 28.75, -2.5), (0, 0, -1)), revolution_arc=F8_T26_ANGLE, mode=Mode.SUBTRACT)


with BuildPart() as f9:
    # F0 (on Top) → F9 (new body, symmetric)
    with BuildSketch(Plane.XY):
        Polygon((-24.25, 0), (-1.25, 0), (-1.25, 40), (-2.55, 40), (-2.55, 1.3), (-24.25, 1.3), align=None)
        with Locations((-32.25, 0.65)):
            Rectangle(F0_W, F0_H)
        with Locations((-26.25, 0.65)):
            Rectangle(F0_W_2, F0_H)
    extrude(amount=F9_DEPTH, both=True)


with BuildPart() as f10_1:
    # F10: instance of F9
    add(f9.part.mirror(Plane.YZ))


solid = Compound([f2_1.part, f9.part, f10_1.part])
